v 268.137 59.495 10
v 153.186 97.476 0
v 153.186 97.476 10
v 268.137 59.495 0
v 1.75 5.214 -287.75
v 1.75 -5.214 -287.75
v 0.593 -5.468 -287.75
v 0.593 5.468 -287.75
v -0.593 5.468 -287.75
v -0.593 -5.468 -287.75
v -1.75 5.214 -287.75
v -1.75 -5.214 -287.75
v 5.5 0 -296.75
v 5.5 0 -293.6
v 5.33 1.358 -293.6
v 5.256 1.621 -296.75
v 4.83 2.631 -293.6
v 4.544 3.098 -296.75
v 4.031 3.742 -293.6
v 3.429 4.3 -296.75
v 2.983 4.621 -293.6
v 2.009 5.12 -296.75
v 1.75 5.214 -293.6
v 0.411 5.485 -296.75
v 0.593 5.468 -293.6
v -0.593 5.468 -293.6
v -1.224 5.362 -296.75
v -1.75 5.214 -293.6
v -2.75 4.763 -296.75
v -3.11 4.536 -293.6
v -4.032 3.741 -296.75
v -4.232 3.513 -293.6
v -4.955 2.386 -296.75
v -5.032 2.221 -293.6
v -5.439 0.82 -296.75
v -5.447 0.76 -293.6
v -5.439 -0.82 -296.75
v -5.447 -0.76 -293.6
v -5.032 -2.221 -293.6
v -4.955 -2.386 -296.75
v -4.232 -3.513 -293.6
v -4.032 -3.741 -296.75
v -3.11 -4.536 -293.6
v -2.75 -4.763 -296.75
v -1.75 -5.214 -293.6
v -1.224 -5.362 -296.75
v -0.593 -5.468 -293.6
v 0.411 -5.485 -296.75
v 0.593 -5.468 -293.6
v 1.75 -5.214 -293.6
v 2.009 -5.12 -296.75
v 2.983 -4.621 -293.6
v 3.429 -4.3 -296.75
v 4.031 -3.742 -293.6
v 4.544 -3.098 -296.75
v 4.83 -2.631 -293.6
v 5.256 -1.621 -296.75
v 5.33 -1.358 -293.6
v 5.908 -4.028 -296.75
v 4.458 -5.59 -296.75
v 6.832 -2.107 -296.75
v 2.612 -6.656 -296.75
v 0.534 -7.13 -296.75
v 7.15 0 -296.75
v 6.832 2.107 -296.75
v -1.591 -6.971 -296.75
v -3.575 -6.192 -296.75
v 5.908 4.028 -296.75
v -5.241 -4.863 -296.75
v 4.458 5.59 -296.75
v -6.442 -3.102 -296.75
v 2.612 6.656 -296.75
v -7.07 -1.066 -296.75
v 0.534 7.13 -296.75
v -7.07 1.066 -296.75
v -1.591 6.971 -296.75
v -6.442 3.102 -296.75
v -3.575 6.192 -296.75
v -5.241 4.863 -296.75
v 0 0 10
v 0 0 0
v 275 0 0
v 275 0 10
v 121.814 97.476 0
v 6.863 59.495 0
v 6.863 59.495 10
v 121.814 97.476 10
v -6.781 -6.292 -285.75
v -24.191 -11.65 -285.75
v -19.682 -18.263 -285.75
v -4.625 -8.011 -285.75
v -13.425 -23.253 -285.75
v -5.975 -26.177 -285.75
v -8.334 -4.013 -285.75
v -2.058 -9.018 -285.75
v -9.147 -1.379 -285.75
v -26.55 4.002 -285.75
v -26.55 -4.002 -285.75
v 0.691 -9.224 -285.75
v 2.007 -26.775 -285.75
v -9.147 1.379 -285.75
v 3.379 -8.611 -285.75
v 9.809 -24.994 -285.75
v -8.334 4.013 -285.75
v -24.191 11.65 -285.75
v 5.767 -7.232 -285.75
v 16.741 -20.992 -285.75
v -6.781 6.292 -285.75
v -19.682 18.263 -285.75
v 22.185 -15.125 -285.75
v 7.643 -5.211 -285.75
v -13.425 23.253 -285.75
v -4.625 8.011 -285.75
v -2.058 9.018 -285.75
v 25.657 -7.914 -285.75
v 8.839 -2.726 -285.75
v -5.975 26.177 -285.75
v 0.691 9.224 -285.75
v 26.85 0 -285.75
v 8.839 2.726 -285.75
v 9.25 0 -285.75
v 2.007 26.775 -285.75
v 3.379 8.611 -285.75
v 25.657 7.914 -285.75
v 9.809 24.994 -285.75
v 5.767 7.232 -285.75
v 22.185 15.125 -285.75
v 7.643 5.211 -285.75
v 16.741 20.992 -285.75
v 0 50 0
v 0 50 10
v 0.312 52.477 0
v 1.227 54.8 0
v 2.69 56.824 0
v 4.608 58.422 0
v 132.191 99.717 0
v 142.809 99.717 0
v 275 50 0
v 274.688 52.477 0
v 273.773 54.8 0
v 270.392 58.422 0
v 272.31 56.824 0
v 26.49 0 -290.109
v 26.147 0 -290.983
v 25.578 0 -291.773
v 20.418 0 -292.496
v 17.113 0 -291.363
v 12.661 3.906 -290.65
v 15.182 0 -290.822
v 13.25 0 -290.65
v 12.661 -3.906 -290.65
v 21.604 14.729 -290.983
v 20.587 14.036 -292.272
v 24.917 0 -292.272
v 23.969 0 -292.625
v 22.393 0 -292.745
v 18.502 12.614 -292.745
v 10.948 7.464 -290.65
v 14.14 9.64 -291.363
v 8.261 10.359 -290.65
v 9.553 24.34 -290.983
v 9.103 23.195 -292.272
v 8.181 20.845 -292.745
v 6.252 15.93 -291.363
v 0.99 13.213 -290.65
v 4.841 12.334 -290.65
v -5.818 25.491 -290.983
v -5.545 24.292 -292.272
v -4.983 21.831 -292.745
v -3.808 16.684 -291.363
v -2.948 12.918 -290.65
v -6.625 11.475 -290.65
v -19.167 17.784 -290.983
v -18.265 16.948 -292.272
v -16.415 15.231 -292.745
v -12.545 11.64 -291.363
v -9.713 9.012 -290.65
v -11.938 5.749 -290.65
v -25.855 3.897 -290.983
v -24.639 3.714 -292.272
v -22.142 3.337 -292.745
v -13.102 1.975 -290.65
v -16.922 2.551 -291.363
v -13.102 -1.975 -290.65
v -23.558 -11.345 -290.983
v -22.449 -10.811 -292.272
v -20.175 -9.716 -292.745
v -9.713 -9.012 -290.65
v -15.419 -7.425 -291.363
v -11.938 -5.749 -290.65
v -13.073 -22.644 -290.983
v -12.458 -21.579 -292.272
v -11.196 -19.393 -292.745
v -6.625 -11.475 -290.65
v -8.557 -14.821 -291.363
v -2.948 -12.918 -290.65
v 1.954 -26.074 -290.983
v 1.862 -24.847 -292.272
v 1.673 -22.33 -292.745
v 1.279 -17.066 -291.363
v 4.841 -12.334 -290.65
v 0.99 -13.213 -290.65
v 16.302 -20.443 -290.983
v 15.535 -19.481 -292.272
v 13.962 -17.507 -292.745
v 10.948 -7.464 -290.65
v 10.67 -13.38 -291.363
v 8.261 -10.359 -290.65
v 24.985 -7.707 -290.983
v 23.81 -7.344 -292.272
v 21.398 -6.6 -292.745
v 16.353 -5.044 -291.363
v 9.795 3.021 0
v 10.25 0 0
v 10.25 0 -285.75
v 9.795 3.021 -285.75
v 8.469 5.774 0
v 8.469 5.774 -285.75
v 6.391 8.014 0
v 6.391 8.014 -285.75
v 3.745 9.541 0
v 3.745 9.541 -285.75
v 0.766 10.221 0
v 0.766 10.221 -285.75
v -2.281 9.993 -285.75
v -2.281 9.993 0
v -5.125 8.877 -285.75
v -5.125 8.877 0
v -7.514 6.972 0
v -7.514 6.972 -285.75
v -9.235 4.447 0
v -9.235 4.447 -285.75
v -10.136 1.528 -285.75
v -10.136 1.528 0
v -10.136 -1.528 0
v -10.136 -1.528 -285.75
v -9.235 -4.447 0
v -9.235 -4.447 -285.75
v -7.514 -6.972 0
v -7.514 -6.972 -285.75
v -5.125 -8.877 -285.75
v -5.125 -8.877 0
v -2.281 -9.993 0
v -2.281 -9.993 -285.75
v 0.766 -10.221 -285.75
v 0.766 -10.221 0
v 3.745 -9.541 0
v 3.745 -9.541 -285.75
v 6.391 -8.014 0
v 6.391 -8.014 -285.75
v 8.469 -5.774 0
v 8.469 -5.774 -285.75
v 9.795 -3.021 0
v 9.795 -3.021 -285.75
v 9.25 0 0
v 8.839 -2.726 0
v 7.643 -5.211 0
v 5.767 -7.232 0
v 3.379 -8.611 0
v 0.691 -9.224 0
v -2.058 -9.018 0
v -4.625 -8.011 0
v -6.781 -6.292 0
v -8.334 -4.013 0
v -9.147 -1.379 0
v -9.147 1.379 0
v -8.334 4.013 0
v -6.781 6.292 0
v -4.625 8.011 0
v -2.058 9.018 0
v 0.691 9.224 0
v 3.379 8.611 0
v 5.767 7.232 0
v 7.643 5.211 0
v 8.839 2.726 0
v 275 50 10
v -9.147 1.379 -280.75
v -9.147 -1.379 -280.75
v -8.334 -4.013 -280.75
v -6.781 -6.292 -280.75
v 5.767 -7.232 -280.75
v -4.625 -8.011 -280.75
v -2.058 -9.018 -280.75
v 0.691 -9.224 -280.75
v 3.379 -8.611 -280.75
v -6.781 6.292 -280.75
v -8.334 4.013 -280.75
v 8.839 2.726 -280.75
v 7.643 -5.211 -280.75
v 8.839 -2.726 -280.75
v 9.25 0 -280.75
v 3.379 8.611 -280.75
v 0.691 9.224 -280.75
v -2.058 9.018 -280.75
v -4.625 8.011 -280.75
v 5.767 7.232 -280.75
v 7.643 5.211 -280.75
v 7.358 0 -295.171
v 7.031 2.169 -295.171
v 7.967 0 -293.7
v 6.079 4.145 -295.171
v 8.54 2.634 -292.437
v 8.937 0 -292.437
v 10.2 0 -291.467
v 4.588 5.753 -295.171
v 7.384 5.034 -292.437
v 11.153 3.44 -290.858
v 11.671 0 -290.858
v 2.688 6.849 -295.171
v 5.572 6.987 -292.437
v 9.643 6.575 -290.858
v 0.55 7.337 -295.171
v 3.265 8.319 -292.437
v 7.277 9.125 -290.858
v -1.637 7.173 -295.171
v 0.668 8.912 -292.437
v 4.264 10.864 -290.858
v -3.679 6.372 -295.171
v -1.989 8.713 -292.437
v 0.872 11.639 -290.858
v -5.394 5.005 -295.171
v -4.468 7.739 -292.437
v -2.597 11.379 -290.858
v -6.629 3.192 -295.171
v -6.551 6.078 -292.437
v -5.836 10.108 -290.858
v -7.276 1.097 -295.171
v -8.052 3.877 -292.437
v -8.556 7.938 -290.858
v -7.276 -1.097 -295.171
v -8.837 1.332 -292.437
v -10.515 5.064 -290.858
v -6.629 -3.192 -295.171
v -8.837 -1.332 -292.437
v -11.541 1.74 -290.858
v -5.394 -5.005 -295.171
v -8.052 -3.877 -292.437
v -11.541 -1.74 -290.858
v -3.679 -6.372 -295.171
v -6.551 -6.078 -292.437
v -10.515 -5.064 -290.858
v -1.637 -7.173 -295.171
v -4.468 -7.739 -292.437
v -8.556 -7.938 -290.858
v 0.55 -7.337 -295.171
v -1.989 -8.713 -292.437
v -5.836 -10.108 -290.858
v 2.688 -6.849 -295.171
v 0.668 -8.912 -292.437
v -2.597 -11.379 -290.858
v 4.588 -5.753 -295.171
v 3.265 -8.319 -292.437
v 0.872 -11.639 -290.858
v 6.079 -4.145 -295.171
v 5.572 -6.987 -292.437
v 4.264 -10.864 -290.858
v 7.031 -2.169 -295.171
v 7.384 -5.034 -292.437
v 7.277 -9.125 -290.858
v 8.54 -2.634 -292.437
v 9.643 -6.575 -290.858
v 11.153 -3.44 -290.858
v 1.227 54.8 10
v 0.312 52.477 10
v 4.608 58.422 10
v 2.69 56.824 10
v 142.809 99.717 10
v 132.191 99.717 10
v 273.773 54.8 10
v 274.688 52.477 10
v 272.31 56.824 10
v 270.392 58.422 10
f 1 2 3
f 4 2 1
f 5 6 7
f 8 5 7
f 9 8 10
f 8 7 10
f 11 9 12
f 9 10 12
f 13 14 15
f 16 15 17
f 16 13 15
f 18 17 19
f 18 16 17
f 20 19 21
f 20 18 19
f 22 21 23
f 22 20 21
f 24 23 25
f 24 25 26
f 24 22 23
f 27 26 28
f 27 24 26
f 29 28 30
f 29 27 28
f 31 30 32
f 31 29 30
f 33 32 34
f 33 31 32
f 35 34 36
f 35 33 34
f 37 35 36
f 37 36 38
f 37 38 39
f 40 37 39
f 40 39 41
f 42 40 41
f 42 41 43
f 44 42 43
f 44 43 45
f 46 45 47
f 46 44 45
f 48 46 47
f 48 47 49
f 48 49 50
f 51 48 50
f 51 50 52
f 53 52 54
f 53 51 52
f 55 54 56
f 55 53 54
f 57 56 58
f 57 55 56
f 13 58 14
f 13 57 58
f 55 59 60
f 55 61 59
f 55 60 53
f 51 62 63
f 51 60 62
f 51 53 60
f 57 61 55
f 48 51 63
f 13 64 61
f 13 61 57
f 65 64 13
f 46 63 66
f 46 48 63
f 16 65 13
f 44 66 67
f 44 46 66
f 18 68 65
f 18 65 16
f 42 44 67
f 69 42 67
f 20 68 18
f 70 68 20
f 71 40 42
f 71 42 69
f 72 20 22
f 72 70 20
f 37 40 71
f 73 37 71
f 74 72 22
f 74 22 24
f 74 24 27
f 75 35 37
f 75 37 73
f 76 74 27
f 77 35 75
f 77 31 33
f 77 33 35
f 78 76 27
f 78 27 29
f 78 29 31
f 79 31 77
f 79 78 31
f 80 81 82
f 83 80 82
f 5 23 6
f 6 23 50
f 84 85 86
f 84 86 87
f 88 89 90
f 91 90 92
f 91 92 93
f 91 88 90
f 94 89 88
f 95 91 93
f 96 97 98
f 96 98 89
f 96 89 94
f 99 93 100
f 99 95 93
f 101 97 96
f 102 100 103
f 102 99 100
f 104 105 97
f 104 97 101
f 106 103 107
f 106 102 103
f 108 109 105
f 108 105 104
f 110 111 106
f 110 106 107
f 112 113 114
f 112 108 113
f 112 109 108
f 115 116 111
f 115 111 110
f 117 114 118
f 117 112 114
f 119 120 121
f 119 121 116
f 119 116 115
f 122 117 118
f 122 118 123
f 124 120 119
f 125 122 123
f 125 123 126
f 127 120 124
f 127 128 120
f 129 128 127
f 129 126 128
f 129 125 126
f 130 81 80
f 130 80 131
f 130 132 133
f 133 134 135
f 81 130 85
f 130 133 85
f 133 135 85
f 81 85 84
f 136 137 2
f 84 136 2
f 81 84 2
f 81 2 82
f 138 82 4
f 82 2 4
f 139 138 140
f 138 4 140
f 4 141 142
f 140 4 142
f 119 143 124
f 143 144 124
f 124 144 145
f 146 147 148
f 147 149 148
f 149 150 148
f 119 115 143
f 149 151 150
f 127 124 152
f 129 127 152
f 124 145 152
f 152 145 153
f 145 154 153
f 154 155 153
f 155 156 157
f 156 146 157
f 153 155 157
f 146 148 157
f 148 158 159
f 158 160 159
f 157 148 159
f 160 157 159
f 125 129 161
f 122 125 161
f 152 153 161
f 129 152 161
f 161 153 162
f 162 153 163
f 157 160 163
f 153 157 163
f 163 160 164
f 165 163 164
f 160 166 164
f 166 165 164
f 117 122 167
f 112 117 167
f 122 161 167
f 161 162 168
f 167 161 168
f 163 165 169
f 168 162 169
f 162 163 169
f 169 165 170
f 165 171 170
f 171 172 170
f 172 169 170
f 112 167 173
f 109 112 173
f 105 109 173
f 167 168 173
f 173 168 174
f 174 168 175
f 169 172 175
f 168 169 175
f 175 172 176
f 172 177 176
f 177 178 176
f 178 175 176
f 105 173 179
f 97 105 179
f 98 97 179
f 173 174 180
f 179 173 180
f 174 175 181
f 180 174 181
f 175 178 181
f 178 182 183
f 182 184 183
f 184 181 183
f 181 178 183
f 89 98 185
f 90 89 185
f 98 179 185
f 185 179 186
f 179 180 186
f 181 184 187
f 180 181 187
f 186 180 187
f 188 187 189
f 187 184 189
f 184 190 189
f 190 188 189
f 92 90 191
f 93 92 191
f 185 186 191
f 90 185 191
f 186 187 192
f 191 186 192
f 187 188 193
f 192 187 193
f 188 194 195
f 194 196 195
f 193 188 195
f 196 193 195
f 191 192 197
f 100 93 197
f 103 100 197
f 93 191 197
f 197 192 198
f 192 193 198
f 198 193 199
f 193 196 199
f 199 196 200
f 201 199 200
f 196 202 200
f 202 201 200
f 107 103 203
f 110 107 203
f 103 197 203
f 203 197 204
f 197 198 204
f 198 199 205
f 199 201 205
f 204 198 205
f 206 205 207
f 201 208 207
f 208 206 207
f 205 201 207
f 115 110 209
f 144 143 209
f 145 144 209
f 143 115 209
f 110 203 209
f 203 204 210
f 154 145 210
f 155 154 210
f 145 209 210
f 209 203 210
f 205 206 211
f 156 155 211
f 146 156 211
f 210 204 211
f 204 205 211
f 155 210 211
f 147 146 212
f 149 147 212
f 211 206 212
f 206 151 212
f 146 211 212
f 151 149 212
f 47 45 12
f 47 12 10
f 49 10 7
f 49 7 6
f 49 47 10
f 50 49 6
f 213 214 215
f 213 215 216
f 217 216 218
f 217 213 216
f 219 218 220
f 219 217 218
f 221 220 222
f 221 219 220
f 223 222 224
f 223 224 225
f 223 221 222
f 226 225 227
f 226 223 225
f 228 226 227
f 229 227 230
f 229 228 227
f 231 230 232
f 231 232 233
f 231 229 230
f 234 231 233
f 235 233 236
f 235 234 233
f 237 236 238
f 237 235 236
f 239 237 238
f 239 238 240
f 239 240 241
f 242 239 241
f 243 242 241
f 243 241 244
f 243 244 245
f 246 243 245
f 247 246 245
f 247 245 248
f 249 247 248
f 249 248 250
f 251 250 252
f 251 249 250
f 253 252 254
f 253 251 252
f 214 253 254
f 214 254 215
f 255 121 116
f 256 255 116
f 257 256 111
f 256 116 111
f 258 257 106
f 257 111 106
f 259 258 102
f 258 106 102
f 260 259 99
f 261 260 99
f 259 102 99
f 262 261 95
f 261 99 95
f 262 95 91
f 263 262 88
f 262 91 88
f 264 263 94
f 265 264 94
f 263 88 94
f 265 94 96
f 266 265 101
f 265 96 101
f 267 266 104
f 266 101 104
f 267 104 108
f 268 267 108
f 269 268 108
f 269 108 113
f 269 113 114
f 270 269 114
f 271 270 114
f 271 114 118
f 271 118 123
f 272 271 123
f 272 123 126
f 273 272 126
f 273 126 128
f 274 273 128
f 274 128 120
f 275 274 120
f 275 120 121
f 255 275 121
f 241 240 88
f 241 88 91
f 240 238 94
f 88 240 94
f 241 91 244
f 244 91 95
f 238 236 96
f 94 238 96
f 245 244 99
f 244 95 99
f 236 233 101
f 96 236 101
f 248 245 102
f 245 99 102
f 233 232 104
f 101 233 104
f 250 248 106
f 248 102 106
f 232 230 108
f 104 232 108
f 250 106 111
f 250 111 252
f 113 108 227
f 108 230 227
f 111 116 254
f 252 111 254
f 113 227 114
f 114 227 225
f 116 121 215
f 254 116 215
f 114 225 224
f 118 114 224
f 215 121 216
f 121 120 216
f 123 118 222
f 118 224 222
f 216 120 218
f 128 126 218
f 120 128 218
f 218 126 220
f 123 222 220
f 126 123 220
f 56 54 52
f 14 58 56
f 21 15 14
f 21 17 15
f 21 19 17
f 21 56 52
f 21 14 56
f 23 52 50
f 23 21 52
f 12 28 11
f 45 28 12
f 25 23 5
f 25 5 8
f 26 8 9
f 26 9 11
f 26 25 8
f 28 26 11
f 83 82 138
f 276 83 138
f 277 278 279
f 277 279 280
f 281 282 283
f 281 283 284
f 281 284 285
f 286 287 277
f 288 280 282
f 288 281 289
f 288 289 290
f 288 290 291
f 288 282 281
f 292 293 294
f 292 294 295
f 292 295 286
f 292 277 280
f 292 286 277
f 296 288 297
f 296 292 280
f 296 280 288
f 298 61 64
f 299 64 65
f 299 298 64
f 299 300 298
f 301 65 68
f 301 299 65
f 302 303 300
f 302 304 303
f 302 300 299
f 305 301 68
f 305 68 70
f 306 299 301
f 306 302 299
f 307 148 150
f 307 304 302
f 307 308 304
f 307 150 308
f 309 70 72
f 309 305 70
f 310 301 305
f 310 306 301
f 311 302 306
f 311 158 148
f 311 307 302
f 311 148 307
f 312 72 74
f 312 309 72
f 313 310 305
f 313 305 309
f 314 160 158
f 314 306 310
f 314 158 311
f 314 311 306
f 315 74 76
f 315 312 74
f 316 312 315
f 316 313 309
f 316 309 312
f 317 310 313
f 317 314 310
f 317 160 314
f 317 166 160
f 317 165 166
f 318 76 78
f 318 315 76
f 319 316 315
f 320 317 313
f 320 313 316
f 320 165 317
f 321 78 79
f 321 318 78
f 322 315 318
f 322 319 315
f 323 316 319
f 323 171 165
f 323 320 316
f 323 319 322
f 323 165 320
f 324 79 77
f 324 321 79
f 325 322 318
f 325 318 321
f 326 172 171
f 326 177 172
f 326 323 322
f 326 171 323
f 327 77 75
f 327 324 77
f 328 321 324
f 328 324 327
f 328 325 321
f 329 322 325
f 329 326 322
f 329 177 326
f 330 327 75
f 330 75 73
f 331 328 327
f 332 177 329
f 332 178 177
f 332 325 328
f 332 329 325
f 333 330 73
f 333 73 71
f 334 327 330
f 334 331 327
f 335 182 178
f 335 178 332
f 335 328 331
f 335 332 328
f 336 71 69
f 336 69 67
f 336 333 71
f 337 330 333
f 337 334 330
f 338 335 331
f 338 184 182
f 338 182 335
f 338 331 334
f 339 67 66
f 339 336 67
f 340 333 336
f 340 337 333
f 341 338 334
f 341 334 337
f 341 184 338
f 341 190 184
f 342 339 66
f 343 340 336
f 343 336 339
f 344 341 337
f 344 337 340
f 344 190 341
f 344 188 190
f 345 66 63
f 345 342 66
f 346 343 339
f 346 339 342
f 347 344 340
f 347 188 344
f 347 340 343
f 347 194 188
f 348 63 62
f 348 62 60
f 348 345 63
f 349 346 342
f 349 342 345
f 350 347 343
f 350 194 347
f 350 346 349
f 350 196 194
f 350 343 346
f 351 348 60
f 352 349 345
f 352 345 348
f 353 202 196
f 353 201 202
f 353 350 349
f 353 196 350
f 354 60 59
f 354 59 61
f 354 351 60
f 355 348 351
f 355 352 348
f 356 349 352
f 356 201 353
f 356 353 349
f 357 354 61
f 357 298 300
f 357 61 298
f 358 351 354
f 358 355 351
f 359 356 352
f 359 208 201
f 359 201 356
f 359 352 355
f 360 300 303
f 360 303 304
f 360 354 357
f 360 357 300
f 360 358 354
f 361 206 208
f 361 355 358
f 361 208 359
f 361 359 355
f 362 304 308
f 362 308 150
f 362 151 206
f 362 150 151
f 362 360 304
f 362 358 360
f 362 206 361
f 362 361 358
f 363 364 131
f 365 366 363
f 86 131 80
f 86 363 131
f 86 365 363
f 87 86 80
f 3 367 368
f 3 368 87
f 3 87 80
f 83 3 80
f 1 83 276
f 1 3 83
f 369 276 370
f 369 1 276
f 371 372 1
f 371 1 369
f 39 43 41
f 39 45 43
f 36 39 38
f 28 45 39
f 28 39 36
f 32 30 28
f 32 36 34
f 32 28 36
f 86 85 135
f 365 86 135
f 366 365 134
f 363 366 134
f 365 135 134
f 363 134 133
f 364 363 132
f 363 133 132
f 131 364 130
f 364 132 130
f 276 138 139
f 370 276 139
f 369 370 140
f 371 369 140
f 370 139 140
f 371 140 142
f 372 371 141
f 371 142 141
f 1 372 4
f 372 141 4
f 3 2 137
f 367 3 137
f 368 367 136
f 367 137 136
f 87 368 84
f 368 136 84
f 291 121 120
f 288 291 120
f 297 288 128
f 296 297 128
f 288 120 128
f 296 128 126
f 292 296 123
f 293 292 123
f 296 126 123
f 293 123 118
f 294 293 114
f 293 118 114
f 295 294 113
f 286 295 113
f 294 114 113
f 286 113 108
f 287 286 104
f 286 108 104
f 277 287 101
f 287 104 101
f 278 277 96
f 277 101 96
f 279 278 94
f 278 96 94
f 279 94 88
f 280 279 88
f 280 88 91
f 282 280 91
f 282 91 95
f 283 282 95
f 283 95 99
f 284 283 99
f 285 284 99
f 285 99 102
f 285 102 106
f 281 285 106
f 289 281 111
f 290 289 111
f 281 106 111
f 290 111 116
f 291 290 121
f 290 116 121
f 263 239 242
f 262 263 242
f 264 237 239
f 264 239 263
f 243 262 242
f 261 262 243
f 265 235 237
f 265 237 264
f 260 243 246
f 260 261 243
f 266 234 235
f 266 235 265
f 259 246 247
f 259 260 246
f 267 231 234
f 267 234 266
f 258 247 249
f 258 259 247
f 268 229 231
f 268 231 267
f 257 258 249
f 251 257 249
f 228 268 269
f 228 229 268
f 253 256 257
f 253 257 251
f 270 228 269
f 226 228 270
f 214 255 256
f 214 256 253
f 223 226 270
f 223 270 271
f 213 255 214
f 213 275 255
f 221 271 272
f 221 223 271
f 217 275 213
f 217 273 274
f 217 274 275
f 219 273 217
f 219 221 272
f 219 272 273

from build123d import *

# Parameters (mm, degrees)
SKETCH003_R  = 10.25
PAD001_DEPTH = 285.75
SKETCH004_R  = 9.25
HOLE_DEPTH   = 285.751
POCKET_DEPTH = 5.85
SKETCH002_R  = 9.25
PAD_DEPTH    = 5
PAD002_DEPTH = 10


with BuildPart() as spool:
    # Sketch003 → Pad001 (new body)
    with BuildSketch(Plane.XY):
        Circle(SKETCH003_R)
    extrude(amount=-PAD001_DEPTH)

    # Sketch004 (on Face3 of Pad001) → Hole (cut, through all)
    with BuildSketch(Plane(origin=(0, 0, -285.75), x_dir=(1, 0, 0), z_dir=(0, 0, -1))):
        Circle(SKETCH004_R)
    extrude(amount=-HOLE_DEPTH, mode=Mode.SUBTRACT)


with BuildPart() as endcap:
    # Sketch → Revolution (revolve)
    with BuildSketch(Plane.XZ):
        with BuildLine():
            Line((0, 0), (0, 7.85))
            Line((0, 7.85), (5.5, 7.85))
            Line((5.5, 7.85), (5.5, 11))
            Line((5.5, 11), (7.15, 11))
            ThreePointArc((7.15, 11), (8.93664793, 6.6866493396), (13.2499980066, 4.9))
            add(Edge.make_bspline(
                [(13.2499980066, 4.9), (17.3499980066, 4.9), (18.65, 7), (22.75, 7)],
                knots=[0, 0, 0, 0, 9.7293370792, 9.7293370792, 9.7293370792, 9.7293370792], degree=3))
            add(Edge.make_bspline(
                [(26.85, 0), (26.85, 3.5), (26.85, 7), (22.75, 7)],
                knots=[0, 0, 0, 0, 5.9288425557, 5.9288425557, 5.9288425557, 5.9288425557], degree=3))
            Line((26.85, 0), (0, 0))
        make_face()
    revolve(axis=Axis((0, 0, 0), (0, 0, 1)))

    # Sketch001 (on Face1 of Revolution) → Pocket (cut)
    with BuildSketch(Plane(origin=(0, 0, 7.85), x_dir=(-1, 0, 0), z_dir=(0, 0, 1))):
        with BuildLine():
            Line((1.75, -5.2141634037), (1.75, 5.2141634037))
            ThreePointArc((1.75, 5.2141634037), (0, 5.5), (-1.75, 5.2141634037))
            Line((-1.75, -5.2141634037), (-1.75, 5.2141634037))
            ThreePointArc((-1.75, -5.2141634037), (0, -5.5), (1.75, -5.2141634037))
        make_face()
    extrude(amount=-POCKET_DEPTH, mode=Mode.SUBTRACT)

    # Sketch002 → Pad (join)
    with BuildSketch(Plane.XY):
        Circle(SKETCH002_R)
    extrude(amount=-PAD_DEPTH)


with BuildPart() as part_mirroring:
    # Part__Mirroring: instance of EndCap
    add(endcap.part.mirror(Plane(origin=(0, 0, -142.875), x_dir=(0, 1, 0), z_dir=(0, 0, 1))))


with BuildPart() as motormount:
    # Sketch005 → Pad002 (new body)
    with BuildSketch(Plane.XY):
        with BuildLine():
            Line((0, 0), (275, 0))
            Line((275, 0), (275, 50))
            ThreePointArc((275, 50), (273.1047069355, 55.8577918613), (268.137254902, 59.4951372649))
            Line((153.1862745098, 97.4756863247), (268.137254902, 59.4951372649))
            ThreePointArc((153.1862745098, 97.4756863247), (137.5, 100), (121.8137254902, 97.4756863247))
            Line((6.862745098, 59.4951372649), (121.8137254902, 97.4756863247))
            ThreePointArc((6.862745098, 59.4951372649), (1.8952930645, 55.8577918613), (0, 50))
            Line((0, 0), (0, 50))
        make_face()
    extrude(amount=PAD002_DEPTH)


solid = Compound([spool.part, part_mirroring.part, motormount.part])
